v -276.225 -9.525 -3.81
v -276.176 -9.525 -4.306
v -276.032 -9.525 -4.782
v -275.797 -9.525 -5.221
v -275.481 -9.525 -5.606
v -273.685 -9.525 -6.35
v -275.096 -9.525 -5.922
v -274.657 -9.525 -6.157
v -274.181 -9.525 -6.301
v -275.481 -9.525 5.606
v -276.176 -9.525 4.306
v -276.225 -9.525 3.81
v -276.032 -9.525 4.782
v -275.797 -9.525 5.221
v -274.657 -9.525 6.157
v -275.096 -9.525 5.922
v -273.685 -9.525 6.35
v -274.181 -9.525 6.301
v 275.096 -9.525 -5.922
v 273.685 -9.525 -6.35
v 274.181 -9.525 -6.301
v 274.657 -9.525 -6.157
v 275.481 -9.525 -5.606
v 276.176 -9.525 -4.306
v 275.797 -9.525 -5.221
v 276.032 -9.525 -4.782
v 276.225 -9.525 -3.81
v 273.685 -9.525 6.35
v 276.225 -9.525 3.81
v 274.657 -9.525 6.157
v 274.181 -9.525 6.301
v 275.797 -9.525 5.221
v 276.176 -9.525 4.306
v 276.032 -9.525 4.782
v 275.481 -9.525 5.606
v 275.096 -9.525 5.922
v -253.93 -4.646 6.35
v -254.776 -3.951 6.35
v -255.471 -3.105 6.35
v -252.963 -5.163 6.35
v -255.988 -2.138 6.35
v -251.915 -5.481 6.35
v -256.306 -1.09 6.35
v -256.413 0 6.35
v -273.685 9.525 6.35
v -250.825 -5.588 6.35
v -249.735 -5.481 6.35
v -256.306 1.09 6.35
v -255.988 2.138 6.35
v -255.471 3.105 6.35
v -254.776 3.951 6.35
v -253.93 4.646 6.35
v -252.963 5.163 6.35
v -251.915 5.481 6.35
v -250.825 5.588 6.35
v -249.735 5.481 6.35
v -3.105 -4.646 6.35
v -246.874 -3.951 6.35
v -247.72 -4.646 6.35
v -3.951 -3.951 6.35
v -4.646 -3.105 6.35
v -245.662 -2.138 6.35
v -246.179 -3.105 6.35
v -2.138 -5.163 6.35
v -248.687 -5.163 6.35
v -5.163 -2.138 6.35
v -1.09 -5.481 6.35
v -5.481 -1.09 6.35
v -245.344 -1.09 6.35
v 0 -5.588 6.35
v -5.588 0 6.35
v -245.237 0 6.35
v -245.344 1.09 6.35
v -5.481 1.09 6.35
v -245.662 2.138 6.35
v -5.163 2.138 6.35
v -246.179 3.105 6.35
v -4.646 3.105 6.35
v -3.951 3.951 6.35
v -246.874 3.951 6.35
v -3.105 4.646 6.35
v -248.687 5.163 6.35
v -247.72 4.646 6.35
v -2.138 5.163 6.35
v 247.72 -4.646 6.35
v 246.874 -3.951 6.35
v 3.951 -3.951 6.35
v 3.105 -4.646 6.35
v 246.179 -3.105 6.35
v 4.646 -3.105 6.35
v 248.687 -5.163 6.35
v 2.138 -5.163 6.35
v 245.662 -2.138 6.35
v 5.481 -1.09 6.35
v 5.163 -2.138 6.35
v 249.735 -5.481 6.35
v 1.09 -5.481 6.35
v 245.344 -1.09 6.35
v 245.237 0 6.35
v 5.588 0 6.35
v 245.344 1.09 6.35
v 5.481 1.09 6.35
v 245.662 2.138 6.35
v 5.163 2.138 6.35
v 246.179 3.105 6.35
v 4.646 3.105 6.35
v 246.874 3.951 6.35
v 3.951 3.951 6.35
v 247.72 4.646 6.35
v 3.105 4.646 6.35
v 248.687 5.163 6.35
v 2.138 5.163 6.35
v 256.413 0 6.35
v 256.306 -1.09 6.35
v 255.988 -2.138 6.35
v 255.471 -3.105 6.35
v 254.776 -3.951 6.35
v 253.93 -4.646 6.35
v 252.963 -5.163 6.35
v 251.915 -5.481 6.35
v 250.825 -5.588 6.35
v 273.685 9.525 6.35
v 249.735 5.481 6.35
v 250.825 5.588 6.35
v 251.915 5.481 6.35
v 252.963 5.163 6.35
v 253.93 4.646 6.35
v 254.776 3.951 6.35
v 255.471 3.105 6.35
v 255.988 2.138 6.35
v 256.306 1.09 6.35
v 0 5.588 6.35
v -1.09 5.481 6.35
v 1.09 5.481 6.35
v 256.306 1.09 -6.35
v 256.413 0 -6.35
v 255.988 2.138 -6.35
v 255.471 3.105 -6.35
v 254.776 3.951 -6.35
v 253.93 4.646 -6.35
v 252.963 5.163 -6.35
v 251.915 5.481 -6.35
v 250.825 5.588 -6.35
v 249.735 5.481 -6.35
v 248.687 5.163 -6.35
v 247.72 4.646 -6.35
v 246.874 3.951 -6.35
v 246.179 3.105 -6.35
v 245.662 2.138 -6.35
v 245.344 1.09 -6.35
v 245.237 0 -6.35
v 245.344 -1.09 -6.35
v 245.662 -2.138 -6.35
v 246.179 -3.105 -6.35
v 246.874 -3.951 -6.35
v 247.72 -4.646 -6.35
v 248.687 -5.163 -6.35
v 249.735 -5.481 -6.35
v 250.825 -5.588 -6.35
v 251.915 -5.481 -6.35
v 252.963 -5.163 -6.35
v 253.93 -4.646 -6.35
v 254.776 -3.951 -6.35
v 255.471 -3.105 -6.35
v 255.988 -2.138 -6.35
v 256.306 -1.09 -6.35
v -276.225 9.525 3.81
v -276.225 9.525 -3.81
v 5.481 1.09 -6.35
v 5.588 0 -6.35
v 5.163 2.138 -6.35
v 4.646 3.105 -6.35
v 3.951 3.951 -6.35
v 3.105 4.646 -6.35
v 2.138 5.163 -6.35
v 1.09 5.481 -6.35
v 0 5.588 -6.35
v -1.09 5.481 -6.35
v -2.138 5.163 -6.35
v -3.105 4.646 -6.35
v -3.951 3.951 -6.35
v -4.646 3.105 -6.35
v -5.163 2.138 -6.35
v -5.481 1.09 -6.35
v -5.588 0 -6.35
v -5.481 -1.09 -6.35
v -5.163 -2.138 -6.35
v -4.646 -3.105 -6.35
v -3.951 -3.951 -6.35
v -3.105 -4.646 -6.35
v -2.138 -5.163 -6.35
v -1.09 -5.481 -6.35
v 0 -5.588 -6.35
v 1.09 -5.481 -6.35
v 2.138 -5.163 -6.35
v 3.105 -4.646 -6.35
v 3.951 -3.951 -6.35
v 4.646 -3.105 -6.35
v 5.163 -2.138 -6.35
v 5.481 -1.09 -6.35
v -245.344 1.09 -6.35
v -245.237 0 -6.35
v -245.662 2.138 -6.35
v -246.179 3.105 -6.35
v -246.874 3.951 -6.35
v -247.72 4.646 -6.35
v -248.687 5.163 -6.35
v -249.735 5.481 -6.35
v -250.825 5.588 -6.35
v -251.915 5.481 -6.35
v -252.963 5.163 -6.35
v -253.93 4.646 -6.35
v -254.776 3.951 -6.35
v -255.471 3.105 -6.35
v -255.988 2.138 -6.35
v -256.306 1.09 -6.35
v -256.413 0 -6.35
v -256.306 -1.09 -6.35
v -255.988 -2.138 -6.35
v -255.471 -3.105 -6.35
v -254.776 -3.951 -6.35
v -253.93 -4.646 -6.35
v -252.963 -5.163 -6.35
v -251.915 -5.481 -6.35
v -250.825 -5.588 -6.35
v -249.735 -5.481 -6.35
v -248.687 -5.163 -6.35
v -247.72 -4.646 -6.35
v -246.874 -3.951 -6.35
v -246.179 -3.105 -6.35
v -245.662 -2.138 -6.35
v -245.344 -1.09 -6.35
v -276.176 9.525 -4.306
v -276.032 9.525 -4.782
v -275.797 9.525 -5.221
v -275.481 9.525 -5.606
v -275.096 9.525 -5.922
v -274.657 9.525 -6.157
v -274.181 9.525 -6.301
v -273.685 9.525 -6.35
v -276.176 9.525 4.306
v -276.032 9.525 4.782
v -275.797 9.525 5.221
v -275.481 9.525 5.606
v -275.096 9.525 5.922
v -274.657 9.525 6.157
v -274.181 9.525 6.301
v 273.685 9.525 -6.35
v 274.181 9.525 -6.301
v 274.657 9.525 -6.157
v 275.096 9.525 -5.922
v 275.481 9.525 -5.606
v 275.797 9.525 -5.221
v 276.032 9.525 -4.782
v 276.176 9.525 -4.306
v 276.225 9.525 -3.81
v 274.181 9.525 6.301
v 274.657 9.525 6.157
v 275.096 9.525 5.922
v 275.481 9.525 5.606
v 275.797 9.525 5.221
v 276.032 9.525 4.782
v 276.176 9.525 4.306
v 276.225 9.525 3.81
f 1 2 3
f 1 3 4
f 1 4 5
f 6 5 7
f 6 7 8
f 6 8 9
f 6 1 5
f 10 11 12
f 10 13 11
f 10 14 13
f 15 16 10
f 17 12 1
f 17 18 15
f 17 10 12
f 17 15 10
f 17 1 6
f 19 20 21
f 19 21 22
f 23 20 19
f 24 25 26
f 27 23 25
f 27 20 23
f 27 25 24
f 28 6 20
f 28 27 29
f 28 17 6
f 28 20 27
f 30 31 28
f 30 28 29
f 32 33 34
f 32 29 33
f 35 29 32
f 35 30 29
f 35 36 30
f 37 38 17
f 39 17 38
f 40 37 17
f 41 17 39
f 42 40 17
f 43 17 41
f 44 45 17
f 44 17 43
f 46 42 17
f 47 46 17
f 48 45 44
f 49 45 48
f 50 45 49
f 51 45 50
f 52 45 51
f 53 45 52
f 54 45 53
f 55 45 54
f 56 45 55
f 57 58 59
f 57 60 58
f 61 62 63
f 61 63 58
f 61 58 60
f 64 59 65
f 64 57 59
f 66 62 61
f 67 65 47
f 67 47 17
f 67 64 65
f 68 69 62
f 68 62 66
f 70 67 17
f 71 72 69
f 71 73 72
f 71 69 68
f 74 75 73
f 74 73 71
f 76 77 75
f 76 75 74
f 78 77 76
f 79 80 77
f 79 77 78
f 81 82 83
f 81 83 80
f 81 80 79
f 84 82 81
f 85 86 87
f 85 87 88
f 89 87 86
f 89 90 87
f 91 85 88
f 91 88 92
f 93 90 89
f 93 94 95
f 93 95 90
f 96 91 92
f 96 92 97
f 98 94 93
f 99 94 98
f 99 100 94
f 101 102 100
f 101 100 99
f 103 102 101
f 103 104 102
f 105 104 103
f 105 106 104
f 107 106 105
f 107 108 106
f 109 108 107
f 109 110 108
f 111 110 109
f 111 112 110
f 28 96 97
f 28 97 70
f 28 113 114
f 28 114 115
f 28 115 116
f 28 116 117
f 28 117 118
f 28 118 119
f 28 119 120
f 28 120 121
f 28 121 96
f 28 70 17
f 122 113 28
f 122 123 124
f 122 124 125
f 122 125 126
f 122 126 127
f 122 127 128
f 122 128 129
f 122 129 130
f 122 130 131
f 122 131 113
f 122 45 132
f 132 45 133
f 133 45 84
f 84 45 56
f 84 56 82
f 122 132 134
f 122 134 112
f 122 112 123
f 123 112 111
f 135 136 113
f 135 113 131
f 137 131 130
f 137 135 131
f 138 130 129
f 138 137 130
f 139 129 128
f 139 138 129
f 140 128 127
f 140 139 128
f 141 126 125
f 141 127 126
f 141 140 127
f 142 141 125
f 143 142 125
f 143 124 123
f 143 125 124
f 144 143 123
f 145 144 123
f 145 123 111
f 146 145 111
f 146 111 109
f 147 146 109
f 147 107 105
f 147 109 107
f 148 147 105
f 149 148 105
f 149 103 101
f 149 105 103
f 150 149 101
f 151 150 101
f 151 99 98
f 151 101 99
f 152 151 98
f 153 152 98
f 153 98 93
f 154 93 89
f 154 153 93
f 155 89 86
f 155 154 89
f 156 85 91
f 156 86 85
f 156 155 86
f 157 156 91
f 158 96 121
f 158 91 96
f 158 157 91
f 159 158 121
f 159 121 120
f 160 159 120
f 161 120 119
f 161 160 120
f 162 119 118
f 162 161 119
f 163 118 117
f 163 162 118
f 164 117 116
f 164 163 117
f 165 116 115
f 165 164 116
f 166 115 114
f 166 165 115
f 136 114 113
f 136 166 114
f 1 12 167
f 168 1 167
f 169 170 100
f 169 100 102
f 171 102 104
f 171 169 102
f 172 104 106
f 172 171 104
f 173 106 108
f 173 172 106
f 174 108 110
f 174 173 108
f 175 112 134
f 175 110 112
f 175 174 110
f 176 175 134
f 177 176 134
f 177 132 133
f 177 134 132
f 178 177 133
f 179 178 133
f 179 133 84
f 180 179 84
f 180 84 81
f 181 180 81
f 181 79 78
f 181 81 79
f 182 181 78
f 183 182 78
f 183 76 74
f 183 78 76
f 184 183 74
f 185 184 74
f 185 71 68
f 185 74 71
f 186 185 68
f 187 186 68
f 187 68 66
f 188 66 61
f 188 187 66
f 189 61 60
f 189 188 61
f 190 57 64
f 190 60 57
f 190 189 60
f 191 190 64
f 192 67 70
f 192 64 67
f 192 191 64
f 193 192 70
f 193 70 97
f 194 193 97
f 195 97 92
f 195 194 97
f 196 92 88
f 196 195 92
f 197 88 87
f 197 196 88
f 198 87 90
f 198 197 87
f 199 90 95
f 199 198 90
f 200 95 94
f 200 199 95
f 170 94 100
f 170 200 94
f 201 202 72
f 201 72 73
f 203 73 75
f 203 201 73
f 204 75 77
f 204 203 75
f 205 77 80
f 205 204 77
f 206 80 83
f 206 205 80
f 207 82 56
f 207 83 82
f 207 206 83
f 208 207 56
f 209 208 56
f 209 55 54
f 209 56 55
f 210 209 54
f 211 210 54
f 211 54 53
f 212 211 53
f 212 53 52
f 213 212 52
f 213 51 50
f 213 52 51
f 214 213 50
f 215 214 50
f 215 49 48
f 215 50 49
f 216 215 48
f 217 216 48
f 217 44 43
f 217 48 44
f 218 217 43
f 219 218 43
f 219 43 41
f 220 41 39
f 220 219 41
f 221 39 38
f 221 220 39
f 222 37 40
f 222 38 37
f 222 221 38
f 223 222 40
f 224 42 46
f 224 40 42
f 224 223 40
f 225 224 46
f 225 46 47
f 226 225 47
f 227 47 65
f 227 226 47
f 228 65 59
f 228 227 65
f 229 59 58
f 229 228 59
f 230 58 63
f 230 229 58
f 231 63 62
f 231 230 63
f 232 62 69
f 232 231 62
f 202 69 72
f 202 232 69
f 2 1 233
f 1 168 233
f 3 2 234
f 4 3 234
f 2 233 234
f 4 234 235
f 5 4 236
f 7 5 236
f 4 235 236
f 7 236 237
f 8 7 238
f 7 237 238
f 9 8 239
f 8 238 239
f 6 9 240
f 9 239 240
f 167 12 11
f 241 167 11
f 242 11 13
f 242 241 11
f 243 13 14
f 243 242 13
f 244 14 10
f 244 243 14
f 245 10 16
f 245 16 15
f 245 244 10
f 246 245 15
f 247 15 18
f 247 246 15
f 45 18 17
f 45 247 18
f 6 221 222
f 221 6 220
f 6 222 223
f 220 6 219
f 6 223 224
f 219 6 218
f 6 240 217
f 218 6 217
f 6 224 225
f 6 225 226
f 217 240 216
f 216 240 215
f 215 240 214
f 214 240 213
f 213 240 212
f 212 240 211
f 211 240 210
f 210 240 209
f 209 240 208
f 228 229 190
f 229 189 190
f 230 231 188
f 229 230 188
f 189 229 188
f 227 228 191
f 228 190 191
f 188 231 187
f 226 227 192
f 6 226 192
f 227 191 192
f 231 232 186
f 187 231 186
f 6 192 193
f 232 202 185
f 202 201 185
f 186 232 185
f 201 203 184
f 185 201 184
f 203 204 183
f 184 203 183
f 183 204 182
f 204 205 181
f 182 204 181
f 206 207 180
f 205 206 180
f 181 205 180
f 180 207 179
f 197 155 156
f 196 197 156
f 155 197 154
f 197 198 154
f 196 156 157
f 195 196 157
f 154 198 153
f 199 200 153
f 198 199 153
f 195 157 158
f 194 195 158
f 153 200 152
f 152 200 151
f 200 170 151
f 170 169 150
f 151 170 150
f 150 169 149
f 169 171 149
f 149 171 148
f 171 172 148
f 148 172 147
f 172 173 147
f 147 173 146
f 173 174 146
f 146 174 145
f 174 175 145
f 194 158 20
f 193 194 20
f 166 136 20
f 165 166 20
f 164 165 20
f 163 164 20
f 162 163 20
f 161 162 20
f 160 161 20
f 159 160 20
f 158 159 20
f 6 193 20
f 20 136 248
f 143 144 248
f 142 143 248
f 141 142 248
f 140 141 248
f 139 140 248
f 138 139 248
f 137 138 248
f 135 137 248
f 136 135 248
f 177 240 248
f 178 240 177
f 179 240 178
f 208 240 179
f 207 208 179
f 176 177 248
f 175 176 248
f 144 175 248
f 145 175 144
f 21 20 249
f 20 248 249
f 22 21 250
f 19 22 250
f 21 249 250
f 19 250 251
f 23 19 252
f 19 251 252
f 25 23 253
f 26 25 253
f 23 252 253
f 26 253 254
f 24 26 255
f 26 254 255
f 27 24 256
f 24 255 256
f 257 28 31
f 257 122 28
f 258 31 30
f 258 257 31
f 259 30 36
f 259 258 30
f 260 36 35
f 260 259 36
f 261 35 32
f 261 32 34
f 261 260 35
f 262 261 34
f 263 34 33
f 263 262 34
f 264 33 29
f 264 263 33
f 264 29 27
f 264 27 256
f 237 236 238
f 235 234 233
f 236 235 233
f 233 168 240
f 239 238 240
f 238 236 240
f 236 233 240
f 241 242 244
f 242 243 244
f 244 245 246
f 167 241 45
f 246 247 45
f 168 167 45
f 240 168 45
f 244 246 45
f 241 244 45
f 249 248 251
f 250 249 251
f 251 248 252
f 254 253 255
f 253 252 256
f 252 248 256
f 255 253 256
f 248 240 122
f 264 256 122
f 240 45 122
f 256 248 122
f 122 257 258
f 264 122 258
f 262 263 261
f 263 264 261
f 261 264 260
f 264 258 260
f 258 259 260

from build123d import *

# Parameters (mm, degrees)
SKETCH1_W               = 552.45
SKETCH1_H               = 19.05
BOSS_EXTRUDE1_DEPTH     = 6.35
CUT_EXTRUDE1_DEPTH      = 277.680802099
CUT_EXTRUDE1_DEPTH_BACK = 277.680802099
SKETCH2_R               = 5.588
FILLET1_R               = 2.54


with BuildPart() as part:
    # Sketch1 → Boss-Extrude1 (new, symmetric)
    with BuildSketch(Plane.XY):
        Rectangle(SKETCH1_W, SKETCH1_H)
    extrude(amount=BOSS_EXTRUDE1_DEPTH, both=True)

    # Sketch2 → Cut-Extrude1 (cut, two sides: drawn at the far end of the back side and taken through both)
    with BuildSketch(Plane.XY.offset(6.35).offset(-CUT_EXTRUDE1_DEPTH_BACK)):
        Circle(SKETCH2_R)
        with Locations((250.825, 0)):
            Circle(SKETCH2_R)
        with Locations((-250.825, 0)):
            Circle(SKETCH2_R)
    extrude(amount=CUT_EXTRUDE1_DEPTH + CUT_EXTRUDE1_DEPTH_BACK, mode=Mode.SUBTRACT)

    # Fillet1
    fillet1_edges = [part.edges().sort_by_distance(p)[0] for p in [
        (-276.225, 0, 6.35),
        (276.225, 0, 6.35),
        (-276.225, 0, -6.35),
        (276.225, 0, -6.35),
    ]]
    fillet(fillet1_edges, radius=FILLET1_R)


solid = part.part
